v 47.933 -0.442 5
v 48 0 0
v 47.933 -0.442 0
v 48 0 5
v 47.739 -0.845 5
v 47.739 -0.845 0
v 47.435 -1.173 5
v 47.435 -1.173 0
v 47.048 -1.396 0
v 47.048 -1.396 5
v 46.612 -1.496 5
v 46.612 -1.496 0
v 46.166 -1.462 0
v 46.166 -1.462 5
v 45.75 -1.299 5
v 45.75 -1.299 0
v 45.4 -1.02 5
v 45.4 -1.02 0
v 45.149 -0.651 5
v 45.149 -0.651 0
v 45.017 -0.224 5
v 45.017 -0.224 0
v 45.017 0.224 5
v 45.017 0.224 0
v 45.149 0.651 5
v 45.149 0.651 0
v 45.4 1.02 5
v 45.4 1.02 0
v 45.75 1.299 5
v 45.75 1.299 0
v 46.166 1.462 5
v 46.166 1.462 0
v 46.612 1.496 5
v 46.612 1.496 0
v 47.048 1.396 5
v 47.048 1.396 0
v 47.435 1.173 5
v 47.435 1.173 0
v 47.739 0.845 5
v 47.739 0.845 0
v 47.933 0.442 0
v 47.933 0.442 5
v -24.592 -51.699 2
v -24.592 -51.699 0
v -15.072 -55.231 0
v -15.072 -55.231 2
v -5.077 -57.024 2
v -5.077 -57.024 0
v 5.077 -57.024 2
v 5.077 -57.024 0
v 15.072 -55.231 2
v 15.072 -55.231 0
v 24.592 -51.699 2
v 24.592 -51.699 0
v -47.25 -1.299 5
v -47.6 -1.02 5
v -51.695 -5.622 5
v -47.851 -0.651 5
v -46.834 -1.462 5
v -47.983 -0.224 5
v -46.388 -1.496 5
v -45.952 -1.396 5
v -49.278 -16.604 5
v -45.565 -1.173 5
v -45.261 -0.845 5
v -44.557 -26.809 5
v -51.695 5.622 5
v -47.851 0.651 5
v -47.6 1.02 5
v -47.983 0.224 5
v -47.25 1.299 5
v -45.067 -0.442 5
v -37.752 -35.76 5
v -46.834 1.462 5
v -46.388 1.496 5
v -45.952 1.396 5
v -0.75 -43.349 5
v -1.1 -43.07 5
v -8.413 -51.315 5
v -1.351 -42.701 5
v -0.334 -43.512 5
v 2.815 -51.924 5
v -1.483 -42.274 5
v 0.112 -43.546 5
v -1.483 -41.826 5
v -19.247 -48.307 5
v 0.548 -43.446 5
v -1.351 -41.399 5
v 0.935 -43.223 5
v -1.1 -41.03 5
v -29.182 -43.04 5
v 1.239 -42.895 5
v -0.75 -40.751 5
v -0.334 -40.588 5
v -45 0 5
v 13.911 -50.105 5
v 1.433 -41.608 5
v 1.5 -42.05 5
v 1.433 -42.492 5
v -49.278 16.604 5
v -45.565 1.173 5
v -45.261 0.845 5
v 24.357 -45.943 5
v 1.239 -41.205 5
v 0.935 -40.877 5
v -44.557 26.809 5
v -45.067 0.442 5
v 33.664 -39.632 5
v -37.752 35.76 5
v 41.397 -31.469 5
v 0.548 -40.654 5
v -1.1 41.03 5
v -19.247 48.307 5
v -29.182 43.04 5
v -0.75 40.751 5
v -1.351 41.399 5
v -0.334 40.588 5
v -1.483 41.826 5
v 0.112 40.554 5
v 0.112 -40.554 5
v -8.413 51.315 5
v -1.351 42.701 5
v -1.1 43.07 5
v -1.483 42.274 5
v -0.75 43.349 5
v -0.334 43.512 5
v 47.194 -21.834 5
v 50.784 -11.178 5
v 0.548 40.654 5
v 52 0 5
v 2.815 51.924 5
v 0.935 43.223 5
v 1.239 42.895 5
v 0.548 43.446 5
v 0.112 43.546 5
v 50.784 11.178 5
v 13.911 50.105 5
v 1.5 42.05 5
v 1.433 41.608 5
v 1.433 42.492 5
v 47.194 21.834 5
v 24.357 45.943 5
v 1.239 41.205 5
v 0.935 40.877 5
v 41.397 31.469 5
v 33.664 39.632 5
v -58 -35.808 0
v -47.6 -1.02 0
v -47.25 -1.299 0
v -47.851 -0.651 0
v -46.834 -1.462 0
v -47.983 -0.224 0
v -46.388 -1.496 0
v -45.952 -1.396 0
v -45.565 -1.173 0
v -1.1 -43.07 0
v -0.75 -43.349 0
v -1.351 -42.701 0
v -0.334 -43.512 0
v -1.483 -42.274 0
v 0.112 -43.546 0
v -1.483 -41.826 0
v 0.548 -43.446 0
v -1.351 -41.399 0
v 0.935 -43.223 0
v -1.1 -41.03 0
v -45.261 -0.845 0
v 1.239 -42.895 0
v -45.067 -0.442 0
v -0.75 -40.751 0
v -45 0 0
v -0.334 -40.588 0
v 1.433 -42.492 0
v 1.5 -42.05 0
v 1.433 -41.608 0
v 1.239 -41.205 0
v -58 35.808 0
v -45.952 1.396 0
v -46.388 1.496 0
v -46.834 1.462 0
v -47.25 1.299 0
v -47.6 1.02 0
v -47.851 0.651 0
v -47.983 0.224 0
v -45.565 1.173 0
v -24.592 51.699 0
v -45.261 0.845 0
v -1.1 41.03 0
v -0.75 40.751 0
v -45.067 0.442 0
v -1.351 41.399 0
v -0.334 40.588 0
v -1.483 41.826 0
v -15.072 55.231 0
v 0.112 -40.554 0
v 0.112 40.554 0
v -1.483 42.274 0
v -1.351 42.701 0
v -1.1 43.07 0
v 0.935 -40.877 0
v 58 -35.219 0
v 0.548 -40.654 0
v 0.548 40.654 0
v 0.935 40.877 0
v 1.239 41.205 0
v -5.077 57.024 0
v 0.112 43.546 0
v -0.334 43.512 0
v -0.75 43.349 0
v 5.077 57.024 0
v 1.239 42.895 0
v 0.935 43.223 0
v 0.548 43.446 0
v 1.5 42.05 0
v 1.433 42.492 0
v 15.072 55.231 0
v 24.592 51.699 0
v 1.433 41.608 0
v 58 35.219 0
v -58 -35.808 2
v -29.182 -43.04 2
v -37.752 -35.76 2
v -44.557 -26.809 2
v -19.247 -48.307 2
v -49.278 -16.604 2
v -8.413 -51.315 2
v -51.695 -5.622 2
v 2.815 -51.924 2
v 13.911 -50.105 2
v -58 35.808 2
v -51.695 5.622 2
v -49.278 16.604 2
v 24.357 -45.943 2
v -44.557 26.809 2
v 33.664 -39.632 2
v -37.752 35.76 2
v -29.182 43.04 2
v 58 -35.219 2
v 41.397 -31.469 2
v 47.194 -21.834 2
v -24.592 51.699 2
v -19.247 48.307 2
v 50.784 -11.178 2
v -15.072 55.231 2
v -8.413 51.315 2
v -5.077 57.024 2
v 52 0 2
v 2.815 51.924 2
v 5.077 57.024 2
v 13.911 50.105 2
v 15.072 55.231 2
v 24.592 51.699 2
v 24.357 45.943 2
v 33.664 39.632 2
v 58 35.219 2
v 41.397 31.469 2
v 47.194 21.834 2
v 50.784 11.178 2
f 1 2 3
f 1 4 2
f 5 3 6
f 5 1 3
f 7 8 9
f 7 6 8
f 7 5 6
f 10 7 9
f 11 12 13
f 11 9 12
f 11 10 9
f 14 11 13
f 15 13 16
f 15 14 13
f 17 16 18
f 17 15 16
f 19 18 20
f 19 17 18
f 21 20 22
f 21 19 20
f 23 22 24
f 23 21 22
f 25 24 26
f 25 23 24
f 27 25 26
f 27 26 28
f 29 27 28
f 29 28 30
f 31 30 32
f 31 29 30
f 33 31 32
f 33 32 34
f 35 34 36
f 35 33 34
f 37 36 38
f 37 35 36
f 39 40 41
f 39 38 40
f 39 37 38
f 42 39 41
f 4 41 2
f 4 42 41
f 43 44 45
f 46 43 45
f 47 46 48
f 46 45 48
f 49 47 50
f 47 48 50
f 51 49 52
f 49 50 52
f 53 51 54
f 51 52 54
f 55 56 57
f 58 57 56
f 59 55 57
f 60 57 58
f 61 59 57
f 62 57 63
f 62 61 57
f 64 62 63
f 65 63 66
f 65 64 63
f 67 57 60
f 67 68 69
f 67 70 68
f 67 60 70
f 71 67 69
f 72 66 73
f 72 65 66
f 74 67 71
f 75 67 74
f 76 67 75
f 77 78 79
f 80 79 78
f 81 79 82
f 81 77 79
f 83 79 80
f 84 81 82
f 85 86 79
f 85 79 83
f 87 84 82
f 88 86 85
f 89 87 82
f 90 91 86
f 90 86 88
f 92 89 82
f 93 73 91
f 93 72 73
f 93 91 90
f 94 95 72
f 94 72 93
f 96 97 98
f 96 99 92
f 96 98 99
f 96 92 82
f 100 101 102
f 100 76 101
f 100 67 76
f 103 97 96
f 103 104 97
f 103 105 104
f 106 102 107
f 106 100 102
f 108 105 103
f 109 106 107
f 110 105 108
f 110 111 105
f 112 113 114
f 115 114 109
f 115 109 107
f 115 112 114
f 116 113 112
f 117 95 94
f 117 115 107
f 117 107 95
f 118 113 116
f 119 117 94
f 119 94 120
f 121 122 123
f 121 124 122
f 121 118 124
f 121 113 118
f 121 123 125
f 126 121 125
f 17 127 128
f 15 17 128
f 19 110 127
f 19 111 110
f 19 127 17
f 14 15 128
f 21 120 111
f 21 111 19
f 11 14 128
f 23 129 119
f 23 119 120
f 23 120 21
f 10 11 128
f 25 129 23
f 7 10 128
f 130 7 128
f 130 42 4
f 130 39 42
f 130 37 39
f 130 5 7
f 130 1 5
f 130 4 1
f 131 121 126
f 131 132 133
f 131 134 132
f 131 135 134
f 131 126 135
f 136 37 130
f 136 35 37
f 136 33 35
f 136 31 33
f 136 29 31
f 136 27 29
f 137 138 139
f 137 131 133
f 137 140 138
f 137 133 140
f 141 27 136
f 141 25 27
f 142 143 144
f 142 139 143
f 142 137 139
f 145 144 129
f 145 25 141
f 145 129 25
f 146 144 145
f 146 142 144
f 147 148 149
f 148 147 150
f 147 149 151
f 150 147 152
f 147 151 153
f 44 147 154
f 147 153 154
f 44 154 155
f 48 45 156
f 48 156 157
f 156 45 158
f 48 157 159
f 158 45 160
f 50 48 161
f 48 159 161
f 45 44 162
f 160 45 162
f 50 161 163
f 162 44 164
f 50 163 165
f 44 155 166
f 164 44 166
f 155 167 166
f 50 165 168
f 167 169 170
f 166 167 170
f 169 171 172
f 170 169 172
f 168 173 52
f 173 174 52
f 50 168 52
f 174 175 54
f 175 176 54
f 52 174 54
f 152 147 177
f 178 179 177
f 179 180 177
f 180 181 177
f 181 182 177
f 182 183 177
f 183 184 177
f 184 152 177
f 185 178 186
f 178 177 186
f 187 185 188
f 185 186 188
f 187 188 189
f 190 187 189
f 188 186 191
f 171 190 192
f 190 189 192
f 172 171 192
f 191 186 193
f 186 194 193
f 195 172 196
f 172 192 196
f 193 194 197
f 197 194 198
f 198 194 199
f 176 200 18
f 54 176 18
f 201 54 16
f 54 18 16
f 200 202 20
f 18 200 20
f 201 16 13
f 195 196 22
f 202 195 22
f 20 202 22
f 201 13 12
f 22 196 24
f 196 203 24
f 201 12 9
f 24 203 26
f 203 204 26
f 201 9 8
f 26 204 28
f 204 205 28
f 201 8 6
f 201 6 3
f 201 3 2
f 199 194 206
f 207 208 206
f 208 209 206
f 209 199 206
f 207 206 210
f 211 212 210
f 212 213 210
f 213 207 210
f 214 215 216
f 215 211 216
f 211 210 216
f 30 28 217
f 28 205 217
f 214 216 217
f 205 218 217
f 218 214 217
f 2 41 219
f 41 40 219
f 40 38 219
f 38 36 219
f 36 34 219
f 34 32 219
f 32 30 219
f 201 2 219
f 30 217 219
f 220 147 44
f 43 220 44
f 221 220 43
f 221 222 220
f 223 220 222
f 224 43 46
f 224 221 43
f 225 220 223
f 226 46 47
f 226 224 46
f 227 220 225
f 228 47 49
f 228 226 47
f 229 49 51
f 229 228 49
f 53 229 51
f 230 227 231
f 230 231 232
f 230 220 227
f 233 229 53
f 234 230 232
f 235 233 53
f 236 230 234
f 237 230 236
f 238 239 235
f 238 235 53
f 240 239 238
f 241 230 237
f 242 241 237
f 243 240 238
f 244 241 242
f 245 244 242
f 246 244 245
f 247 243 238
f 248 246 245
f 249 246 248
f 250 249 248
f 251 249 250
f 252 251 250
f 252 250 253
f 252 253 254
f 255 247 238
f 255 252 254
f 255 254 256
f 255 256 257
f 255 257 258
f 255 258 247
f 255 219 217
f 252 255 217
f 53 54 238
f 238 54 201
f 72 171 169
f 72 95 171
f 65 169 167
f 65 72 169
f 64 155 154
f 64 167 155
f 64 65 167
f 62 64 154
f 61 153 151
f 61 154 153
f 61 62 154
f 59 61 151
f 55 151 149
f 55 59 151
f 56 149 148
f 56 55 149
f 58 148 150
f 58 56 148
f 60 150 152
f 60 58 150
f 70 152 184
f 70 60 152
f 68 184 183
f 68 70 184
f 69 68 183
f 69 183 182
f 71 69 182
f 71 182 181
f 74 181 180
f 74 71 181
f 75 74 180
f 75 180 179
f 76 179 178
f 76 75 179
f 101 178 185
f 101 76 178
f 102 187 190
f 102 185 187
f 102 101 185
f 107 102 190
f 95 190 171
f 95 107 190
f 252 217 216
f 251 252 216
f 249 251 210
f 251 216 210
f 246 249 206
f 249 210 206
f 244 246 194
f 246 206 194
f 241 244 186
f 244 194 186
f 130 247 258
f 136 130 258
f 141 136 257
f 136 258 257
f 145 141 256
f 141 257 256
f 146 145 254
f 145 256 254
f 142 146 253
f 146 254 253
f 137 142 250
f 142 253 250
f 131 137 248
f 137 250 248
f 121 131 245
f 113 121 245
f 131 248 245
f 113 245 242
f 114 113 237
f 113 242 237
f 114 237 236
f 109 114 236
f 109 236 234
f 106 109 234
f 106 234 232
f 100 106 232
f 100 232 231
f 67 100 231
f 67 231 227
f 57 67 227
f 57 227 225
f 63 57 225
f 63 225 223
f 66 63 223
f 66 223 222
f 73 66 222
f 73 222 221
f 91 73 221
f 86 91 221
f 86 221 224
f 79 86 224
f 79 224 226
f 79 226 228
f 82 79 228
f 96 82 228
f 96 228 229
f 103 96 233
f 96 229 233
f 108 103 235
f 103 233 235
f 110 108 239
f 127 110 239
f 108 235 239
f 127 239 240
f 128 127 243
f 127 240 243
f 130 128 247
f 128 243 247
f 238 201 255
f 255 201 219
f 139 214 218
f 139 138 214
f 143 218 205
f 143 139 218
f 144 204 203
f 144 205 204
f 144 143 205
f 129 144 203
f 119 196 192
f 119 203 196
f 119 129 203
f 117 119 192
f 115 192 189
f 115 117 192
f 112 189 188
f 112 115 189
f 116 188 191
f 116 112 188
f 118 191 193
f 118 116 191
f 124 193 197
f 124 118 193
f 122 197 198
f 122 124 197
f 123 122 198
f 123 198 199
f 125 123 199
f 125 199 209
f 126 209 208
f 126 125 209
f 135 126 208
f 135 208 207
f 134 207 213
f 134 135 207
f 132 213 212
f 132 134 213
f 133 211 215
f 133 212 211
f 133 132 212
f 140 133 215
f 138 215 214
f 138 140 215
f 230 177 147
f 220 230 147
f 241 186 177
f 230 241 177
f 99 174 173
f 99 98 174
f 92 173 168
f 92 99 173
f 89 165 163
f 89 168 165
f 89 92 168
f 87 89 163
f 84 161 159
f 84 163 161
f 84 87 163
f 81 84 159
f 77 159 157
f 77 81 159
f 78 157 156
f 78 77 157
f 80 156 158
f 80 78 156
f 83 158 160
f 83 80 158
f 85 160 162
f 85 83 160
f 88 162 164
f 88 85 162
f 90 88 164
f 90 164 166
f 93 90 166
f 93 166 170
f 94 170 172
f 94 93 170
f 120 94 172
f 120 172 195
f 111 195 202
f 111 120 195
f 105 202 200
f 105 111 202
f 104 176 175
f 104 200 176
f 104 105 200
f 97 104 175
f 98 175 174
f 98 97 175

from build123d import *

# Parameters (mm, degrees)
F0_R     = 52
F0_R_2   = 1.5
F1_DEPTH = 5
F3_DEPTH = 2
F4_DEPTH = 2.001


with BuildPart() as f1:
    # F0 (on Top) → F1 (new body)
    with BuildSketch(Plane.XY):
        Circle(F0_R)
        with Locations((0, -42.05)):
            Circle(F0_R_2, mode=Mode.SUBTRACT)
        with Locations((-46.5, 0)):
            Circle(F0_R_2, mode=Mode.SUBTRACT)
        with Locations((46.5, 0)):
            Circle(F0_R_2, mode=Mode.SUBTRACT)
        with Locations((0, 42.05)):
            Circle(F0_R_2, mode=Mode.SUBTRACT)
    extrude(amount=F1_DEPTH)

    # F2 (on Top) → F3 (join)
    with BuildSketch(Plane.XY):
        with BuildLine():
            Line((-24.5919874092, 51.6990972384), (-58, 35.807728358))
            Line((-58, 35.807728358), (-58, 0))
            Line((-58, 0), (-58, -35.807728358))
            Line((-58, -35.807728358), (-24.5919874092, -51.6990972384))
            ThreePointArc((-24.5919874092, -51.6990972384), (0, -57.25), (24.5919874092, -51.6990972384))
            Line((24.5919874092, -51.6990972384), (58, -35.2185990722))
            Line((58, -35.2185990722), (58, 0))
            Line((58, 0), (58, 35.2185990722))
            Line((58, 35.2185990722), (24.5919874092, 51.6990972384))
            ThreePointArc((24.5919874092, 51.6990972384), (0, 57.25), (-24.5919874092, 51.6990972384))
        make_face()
    extrude(amount=F3_DEPTH)

    # F4 (cut, through all): faces of the model
    f4_faces = [f1.faces().sort_by_distance(p)[0] for p in [
        (0, 42.05, 2),
        (46.5, 0, 2),
        (0, -42.05, 2),
        (-46.5, 0, 2),
    ]]
    extrude(f4_faces, amount=-F4_DEPTH, mode=Mode.SUBTRACT)


solid = f1.part
